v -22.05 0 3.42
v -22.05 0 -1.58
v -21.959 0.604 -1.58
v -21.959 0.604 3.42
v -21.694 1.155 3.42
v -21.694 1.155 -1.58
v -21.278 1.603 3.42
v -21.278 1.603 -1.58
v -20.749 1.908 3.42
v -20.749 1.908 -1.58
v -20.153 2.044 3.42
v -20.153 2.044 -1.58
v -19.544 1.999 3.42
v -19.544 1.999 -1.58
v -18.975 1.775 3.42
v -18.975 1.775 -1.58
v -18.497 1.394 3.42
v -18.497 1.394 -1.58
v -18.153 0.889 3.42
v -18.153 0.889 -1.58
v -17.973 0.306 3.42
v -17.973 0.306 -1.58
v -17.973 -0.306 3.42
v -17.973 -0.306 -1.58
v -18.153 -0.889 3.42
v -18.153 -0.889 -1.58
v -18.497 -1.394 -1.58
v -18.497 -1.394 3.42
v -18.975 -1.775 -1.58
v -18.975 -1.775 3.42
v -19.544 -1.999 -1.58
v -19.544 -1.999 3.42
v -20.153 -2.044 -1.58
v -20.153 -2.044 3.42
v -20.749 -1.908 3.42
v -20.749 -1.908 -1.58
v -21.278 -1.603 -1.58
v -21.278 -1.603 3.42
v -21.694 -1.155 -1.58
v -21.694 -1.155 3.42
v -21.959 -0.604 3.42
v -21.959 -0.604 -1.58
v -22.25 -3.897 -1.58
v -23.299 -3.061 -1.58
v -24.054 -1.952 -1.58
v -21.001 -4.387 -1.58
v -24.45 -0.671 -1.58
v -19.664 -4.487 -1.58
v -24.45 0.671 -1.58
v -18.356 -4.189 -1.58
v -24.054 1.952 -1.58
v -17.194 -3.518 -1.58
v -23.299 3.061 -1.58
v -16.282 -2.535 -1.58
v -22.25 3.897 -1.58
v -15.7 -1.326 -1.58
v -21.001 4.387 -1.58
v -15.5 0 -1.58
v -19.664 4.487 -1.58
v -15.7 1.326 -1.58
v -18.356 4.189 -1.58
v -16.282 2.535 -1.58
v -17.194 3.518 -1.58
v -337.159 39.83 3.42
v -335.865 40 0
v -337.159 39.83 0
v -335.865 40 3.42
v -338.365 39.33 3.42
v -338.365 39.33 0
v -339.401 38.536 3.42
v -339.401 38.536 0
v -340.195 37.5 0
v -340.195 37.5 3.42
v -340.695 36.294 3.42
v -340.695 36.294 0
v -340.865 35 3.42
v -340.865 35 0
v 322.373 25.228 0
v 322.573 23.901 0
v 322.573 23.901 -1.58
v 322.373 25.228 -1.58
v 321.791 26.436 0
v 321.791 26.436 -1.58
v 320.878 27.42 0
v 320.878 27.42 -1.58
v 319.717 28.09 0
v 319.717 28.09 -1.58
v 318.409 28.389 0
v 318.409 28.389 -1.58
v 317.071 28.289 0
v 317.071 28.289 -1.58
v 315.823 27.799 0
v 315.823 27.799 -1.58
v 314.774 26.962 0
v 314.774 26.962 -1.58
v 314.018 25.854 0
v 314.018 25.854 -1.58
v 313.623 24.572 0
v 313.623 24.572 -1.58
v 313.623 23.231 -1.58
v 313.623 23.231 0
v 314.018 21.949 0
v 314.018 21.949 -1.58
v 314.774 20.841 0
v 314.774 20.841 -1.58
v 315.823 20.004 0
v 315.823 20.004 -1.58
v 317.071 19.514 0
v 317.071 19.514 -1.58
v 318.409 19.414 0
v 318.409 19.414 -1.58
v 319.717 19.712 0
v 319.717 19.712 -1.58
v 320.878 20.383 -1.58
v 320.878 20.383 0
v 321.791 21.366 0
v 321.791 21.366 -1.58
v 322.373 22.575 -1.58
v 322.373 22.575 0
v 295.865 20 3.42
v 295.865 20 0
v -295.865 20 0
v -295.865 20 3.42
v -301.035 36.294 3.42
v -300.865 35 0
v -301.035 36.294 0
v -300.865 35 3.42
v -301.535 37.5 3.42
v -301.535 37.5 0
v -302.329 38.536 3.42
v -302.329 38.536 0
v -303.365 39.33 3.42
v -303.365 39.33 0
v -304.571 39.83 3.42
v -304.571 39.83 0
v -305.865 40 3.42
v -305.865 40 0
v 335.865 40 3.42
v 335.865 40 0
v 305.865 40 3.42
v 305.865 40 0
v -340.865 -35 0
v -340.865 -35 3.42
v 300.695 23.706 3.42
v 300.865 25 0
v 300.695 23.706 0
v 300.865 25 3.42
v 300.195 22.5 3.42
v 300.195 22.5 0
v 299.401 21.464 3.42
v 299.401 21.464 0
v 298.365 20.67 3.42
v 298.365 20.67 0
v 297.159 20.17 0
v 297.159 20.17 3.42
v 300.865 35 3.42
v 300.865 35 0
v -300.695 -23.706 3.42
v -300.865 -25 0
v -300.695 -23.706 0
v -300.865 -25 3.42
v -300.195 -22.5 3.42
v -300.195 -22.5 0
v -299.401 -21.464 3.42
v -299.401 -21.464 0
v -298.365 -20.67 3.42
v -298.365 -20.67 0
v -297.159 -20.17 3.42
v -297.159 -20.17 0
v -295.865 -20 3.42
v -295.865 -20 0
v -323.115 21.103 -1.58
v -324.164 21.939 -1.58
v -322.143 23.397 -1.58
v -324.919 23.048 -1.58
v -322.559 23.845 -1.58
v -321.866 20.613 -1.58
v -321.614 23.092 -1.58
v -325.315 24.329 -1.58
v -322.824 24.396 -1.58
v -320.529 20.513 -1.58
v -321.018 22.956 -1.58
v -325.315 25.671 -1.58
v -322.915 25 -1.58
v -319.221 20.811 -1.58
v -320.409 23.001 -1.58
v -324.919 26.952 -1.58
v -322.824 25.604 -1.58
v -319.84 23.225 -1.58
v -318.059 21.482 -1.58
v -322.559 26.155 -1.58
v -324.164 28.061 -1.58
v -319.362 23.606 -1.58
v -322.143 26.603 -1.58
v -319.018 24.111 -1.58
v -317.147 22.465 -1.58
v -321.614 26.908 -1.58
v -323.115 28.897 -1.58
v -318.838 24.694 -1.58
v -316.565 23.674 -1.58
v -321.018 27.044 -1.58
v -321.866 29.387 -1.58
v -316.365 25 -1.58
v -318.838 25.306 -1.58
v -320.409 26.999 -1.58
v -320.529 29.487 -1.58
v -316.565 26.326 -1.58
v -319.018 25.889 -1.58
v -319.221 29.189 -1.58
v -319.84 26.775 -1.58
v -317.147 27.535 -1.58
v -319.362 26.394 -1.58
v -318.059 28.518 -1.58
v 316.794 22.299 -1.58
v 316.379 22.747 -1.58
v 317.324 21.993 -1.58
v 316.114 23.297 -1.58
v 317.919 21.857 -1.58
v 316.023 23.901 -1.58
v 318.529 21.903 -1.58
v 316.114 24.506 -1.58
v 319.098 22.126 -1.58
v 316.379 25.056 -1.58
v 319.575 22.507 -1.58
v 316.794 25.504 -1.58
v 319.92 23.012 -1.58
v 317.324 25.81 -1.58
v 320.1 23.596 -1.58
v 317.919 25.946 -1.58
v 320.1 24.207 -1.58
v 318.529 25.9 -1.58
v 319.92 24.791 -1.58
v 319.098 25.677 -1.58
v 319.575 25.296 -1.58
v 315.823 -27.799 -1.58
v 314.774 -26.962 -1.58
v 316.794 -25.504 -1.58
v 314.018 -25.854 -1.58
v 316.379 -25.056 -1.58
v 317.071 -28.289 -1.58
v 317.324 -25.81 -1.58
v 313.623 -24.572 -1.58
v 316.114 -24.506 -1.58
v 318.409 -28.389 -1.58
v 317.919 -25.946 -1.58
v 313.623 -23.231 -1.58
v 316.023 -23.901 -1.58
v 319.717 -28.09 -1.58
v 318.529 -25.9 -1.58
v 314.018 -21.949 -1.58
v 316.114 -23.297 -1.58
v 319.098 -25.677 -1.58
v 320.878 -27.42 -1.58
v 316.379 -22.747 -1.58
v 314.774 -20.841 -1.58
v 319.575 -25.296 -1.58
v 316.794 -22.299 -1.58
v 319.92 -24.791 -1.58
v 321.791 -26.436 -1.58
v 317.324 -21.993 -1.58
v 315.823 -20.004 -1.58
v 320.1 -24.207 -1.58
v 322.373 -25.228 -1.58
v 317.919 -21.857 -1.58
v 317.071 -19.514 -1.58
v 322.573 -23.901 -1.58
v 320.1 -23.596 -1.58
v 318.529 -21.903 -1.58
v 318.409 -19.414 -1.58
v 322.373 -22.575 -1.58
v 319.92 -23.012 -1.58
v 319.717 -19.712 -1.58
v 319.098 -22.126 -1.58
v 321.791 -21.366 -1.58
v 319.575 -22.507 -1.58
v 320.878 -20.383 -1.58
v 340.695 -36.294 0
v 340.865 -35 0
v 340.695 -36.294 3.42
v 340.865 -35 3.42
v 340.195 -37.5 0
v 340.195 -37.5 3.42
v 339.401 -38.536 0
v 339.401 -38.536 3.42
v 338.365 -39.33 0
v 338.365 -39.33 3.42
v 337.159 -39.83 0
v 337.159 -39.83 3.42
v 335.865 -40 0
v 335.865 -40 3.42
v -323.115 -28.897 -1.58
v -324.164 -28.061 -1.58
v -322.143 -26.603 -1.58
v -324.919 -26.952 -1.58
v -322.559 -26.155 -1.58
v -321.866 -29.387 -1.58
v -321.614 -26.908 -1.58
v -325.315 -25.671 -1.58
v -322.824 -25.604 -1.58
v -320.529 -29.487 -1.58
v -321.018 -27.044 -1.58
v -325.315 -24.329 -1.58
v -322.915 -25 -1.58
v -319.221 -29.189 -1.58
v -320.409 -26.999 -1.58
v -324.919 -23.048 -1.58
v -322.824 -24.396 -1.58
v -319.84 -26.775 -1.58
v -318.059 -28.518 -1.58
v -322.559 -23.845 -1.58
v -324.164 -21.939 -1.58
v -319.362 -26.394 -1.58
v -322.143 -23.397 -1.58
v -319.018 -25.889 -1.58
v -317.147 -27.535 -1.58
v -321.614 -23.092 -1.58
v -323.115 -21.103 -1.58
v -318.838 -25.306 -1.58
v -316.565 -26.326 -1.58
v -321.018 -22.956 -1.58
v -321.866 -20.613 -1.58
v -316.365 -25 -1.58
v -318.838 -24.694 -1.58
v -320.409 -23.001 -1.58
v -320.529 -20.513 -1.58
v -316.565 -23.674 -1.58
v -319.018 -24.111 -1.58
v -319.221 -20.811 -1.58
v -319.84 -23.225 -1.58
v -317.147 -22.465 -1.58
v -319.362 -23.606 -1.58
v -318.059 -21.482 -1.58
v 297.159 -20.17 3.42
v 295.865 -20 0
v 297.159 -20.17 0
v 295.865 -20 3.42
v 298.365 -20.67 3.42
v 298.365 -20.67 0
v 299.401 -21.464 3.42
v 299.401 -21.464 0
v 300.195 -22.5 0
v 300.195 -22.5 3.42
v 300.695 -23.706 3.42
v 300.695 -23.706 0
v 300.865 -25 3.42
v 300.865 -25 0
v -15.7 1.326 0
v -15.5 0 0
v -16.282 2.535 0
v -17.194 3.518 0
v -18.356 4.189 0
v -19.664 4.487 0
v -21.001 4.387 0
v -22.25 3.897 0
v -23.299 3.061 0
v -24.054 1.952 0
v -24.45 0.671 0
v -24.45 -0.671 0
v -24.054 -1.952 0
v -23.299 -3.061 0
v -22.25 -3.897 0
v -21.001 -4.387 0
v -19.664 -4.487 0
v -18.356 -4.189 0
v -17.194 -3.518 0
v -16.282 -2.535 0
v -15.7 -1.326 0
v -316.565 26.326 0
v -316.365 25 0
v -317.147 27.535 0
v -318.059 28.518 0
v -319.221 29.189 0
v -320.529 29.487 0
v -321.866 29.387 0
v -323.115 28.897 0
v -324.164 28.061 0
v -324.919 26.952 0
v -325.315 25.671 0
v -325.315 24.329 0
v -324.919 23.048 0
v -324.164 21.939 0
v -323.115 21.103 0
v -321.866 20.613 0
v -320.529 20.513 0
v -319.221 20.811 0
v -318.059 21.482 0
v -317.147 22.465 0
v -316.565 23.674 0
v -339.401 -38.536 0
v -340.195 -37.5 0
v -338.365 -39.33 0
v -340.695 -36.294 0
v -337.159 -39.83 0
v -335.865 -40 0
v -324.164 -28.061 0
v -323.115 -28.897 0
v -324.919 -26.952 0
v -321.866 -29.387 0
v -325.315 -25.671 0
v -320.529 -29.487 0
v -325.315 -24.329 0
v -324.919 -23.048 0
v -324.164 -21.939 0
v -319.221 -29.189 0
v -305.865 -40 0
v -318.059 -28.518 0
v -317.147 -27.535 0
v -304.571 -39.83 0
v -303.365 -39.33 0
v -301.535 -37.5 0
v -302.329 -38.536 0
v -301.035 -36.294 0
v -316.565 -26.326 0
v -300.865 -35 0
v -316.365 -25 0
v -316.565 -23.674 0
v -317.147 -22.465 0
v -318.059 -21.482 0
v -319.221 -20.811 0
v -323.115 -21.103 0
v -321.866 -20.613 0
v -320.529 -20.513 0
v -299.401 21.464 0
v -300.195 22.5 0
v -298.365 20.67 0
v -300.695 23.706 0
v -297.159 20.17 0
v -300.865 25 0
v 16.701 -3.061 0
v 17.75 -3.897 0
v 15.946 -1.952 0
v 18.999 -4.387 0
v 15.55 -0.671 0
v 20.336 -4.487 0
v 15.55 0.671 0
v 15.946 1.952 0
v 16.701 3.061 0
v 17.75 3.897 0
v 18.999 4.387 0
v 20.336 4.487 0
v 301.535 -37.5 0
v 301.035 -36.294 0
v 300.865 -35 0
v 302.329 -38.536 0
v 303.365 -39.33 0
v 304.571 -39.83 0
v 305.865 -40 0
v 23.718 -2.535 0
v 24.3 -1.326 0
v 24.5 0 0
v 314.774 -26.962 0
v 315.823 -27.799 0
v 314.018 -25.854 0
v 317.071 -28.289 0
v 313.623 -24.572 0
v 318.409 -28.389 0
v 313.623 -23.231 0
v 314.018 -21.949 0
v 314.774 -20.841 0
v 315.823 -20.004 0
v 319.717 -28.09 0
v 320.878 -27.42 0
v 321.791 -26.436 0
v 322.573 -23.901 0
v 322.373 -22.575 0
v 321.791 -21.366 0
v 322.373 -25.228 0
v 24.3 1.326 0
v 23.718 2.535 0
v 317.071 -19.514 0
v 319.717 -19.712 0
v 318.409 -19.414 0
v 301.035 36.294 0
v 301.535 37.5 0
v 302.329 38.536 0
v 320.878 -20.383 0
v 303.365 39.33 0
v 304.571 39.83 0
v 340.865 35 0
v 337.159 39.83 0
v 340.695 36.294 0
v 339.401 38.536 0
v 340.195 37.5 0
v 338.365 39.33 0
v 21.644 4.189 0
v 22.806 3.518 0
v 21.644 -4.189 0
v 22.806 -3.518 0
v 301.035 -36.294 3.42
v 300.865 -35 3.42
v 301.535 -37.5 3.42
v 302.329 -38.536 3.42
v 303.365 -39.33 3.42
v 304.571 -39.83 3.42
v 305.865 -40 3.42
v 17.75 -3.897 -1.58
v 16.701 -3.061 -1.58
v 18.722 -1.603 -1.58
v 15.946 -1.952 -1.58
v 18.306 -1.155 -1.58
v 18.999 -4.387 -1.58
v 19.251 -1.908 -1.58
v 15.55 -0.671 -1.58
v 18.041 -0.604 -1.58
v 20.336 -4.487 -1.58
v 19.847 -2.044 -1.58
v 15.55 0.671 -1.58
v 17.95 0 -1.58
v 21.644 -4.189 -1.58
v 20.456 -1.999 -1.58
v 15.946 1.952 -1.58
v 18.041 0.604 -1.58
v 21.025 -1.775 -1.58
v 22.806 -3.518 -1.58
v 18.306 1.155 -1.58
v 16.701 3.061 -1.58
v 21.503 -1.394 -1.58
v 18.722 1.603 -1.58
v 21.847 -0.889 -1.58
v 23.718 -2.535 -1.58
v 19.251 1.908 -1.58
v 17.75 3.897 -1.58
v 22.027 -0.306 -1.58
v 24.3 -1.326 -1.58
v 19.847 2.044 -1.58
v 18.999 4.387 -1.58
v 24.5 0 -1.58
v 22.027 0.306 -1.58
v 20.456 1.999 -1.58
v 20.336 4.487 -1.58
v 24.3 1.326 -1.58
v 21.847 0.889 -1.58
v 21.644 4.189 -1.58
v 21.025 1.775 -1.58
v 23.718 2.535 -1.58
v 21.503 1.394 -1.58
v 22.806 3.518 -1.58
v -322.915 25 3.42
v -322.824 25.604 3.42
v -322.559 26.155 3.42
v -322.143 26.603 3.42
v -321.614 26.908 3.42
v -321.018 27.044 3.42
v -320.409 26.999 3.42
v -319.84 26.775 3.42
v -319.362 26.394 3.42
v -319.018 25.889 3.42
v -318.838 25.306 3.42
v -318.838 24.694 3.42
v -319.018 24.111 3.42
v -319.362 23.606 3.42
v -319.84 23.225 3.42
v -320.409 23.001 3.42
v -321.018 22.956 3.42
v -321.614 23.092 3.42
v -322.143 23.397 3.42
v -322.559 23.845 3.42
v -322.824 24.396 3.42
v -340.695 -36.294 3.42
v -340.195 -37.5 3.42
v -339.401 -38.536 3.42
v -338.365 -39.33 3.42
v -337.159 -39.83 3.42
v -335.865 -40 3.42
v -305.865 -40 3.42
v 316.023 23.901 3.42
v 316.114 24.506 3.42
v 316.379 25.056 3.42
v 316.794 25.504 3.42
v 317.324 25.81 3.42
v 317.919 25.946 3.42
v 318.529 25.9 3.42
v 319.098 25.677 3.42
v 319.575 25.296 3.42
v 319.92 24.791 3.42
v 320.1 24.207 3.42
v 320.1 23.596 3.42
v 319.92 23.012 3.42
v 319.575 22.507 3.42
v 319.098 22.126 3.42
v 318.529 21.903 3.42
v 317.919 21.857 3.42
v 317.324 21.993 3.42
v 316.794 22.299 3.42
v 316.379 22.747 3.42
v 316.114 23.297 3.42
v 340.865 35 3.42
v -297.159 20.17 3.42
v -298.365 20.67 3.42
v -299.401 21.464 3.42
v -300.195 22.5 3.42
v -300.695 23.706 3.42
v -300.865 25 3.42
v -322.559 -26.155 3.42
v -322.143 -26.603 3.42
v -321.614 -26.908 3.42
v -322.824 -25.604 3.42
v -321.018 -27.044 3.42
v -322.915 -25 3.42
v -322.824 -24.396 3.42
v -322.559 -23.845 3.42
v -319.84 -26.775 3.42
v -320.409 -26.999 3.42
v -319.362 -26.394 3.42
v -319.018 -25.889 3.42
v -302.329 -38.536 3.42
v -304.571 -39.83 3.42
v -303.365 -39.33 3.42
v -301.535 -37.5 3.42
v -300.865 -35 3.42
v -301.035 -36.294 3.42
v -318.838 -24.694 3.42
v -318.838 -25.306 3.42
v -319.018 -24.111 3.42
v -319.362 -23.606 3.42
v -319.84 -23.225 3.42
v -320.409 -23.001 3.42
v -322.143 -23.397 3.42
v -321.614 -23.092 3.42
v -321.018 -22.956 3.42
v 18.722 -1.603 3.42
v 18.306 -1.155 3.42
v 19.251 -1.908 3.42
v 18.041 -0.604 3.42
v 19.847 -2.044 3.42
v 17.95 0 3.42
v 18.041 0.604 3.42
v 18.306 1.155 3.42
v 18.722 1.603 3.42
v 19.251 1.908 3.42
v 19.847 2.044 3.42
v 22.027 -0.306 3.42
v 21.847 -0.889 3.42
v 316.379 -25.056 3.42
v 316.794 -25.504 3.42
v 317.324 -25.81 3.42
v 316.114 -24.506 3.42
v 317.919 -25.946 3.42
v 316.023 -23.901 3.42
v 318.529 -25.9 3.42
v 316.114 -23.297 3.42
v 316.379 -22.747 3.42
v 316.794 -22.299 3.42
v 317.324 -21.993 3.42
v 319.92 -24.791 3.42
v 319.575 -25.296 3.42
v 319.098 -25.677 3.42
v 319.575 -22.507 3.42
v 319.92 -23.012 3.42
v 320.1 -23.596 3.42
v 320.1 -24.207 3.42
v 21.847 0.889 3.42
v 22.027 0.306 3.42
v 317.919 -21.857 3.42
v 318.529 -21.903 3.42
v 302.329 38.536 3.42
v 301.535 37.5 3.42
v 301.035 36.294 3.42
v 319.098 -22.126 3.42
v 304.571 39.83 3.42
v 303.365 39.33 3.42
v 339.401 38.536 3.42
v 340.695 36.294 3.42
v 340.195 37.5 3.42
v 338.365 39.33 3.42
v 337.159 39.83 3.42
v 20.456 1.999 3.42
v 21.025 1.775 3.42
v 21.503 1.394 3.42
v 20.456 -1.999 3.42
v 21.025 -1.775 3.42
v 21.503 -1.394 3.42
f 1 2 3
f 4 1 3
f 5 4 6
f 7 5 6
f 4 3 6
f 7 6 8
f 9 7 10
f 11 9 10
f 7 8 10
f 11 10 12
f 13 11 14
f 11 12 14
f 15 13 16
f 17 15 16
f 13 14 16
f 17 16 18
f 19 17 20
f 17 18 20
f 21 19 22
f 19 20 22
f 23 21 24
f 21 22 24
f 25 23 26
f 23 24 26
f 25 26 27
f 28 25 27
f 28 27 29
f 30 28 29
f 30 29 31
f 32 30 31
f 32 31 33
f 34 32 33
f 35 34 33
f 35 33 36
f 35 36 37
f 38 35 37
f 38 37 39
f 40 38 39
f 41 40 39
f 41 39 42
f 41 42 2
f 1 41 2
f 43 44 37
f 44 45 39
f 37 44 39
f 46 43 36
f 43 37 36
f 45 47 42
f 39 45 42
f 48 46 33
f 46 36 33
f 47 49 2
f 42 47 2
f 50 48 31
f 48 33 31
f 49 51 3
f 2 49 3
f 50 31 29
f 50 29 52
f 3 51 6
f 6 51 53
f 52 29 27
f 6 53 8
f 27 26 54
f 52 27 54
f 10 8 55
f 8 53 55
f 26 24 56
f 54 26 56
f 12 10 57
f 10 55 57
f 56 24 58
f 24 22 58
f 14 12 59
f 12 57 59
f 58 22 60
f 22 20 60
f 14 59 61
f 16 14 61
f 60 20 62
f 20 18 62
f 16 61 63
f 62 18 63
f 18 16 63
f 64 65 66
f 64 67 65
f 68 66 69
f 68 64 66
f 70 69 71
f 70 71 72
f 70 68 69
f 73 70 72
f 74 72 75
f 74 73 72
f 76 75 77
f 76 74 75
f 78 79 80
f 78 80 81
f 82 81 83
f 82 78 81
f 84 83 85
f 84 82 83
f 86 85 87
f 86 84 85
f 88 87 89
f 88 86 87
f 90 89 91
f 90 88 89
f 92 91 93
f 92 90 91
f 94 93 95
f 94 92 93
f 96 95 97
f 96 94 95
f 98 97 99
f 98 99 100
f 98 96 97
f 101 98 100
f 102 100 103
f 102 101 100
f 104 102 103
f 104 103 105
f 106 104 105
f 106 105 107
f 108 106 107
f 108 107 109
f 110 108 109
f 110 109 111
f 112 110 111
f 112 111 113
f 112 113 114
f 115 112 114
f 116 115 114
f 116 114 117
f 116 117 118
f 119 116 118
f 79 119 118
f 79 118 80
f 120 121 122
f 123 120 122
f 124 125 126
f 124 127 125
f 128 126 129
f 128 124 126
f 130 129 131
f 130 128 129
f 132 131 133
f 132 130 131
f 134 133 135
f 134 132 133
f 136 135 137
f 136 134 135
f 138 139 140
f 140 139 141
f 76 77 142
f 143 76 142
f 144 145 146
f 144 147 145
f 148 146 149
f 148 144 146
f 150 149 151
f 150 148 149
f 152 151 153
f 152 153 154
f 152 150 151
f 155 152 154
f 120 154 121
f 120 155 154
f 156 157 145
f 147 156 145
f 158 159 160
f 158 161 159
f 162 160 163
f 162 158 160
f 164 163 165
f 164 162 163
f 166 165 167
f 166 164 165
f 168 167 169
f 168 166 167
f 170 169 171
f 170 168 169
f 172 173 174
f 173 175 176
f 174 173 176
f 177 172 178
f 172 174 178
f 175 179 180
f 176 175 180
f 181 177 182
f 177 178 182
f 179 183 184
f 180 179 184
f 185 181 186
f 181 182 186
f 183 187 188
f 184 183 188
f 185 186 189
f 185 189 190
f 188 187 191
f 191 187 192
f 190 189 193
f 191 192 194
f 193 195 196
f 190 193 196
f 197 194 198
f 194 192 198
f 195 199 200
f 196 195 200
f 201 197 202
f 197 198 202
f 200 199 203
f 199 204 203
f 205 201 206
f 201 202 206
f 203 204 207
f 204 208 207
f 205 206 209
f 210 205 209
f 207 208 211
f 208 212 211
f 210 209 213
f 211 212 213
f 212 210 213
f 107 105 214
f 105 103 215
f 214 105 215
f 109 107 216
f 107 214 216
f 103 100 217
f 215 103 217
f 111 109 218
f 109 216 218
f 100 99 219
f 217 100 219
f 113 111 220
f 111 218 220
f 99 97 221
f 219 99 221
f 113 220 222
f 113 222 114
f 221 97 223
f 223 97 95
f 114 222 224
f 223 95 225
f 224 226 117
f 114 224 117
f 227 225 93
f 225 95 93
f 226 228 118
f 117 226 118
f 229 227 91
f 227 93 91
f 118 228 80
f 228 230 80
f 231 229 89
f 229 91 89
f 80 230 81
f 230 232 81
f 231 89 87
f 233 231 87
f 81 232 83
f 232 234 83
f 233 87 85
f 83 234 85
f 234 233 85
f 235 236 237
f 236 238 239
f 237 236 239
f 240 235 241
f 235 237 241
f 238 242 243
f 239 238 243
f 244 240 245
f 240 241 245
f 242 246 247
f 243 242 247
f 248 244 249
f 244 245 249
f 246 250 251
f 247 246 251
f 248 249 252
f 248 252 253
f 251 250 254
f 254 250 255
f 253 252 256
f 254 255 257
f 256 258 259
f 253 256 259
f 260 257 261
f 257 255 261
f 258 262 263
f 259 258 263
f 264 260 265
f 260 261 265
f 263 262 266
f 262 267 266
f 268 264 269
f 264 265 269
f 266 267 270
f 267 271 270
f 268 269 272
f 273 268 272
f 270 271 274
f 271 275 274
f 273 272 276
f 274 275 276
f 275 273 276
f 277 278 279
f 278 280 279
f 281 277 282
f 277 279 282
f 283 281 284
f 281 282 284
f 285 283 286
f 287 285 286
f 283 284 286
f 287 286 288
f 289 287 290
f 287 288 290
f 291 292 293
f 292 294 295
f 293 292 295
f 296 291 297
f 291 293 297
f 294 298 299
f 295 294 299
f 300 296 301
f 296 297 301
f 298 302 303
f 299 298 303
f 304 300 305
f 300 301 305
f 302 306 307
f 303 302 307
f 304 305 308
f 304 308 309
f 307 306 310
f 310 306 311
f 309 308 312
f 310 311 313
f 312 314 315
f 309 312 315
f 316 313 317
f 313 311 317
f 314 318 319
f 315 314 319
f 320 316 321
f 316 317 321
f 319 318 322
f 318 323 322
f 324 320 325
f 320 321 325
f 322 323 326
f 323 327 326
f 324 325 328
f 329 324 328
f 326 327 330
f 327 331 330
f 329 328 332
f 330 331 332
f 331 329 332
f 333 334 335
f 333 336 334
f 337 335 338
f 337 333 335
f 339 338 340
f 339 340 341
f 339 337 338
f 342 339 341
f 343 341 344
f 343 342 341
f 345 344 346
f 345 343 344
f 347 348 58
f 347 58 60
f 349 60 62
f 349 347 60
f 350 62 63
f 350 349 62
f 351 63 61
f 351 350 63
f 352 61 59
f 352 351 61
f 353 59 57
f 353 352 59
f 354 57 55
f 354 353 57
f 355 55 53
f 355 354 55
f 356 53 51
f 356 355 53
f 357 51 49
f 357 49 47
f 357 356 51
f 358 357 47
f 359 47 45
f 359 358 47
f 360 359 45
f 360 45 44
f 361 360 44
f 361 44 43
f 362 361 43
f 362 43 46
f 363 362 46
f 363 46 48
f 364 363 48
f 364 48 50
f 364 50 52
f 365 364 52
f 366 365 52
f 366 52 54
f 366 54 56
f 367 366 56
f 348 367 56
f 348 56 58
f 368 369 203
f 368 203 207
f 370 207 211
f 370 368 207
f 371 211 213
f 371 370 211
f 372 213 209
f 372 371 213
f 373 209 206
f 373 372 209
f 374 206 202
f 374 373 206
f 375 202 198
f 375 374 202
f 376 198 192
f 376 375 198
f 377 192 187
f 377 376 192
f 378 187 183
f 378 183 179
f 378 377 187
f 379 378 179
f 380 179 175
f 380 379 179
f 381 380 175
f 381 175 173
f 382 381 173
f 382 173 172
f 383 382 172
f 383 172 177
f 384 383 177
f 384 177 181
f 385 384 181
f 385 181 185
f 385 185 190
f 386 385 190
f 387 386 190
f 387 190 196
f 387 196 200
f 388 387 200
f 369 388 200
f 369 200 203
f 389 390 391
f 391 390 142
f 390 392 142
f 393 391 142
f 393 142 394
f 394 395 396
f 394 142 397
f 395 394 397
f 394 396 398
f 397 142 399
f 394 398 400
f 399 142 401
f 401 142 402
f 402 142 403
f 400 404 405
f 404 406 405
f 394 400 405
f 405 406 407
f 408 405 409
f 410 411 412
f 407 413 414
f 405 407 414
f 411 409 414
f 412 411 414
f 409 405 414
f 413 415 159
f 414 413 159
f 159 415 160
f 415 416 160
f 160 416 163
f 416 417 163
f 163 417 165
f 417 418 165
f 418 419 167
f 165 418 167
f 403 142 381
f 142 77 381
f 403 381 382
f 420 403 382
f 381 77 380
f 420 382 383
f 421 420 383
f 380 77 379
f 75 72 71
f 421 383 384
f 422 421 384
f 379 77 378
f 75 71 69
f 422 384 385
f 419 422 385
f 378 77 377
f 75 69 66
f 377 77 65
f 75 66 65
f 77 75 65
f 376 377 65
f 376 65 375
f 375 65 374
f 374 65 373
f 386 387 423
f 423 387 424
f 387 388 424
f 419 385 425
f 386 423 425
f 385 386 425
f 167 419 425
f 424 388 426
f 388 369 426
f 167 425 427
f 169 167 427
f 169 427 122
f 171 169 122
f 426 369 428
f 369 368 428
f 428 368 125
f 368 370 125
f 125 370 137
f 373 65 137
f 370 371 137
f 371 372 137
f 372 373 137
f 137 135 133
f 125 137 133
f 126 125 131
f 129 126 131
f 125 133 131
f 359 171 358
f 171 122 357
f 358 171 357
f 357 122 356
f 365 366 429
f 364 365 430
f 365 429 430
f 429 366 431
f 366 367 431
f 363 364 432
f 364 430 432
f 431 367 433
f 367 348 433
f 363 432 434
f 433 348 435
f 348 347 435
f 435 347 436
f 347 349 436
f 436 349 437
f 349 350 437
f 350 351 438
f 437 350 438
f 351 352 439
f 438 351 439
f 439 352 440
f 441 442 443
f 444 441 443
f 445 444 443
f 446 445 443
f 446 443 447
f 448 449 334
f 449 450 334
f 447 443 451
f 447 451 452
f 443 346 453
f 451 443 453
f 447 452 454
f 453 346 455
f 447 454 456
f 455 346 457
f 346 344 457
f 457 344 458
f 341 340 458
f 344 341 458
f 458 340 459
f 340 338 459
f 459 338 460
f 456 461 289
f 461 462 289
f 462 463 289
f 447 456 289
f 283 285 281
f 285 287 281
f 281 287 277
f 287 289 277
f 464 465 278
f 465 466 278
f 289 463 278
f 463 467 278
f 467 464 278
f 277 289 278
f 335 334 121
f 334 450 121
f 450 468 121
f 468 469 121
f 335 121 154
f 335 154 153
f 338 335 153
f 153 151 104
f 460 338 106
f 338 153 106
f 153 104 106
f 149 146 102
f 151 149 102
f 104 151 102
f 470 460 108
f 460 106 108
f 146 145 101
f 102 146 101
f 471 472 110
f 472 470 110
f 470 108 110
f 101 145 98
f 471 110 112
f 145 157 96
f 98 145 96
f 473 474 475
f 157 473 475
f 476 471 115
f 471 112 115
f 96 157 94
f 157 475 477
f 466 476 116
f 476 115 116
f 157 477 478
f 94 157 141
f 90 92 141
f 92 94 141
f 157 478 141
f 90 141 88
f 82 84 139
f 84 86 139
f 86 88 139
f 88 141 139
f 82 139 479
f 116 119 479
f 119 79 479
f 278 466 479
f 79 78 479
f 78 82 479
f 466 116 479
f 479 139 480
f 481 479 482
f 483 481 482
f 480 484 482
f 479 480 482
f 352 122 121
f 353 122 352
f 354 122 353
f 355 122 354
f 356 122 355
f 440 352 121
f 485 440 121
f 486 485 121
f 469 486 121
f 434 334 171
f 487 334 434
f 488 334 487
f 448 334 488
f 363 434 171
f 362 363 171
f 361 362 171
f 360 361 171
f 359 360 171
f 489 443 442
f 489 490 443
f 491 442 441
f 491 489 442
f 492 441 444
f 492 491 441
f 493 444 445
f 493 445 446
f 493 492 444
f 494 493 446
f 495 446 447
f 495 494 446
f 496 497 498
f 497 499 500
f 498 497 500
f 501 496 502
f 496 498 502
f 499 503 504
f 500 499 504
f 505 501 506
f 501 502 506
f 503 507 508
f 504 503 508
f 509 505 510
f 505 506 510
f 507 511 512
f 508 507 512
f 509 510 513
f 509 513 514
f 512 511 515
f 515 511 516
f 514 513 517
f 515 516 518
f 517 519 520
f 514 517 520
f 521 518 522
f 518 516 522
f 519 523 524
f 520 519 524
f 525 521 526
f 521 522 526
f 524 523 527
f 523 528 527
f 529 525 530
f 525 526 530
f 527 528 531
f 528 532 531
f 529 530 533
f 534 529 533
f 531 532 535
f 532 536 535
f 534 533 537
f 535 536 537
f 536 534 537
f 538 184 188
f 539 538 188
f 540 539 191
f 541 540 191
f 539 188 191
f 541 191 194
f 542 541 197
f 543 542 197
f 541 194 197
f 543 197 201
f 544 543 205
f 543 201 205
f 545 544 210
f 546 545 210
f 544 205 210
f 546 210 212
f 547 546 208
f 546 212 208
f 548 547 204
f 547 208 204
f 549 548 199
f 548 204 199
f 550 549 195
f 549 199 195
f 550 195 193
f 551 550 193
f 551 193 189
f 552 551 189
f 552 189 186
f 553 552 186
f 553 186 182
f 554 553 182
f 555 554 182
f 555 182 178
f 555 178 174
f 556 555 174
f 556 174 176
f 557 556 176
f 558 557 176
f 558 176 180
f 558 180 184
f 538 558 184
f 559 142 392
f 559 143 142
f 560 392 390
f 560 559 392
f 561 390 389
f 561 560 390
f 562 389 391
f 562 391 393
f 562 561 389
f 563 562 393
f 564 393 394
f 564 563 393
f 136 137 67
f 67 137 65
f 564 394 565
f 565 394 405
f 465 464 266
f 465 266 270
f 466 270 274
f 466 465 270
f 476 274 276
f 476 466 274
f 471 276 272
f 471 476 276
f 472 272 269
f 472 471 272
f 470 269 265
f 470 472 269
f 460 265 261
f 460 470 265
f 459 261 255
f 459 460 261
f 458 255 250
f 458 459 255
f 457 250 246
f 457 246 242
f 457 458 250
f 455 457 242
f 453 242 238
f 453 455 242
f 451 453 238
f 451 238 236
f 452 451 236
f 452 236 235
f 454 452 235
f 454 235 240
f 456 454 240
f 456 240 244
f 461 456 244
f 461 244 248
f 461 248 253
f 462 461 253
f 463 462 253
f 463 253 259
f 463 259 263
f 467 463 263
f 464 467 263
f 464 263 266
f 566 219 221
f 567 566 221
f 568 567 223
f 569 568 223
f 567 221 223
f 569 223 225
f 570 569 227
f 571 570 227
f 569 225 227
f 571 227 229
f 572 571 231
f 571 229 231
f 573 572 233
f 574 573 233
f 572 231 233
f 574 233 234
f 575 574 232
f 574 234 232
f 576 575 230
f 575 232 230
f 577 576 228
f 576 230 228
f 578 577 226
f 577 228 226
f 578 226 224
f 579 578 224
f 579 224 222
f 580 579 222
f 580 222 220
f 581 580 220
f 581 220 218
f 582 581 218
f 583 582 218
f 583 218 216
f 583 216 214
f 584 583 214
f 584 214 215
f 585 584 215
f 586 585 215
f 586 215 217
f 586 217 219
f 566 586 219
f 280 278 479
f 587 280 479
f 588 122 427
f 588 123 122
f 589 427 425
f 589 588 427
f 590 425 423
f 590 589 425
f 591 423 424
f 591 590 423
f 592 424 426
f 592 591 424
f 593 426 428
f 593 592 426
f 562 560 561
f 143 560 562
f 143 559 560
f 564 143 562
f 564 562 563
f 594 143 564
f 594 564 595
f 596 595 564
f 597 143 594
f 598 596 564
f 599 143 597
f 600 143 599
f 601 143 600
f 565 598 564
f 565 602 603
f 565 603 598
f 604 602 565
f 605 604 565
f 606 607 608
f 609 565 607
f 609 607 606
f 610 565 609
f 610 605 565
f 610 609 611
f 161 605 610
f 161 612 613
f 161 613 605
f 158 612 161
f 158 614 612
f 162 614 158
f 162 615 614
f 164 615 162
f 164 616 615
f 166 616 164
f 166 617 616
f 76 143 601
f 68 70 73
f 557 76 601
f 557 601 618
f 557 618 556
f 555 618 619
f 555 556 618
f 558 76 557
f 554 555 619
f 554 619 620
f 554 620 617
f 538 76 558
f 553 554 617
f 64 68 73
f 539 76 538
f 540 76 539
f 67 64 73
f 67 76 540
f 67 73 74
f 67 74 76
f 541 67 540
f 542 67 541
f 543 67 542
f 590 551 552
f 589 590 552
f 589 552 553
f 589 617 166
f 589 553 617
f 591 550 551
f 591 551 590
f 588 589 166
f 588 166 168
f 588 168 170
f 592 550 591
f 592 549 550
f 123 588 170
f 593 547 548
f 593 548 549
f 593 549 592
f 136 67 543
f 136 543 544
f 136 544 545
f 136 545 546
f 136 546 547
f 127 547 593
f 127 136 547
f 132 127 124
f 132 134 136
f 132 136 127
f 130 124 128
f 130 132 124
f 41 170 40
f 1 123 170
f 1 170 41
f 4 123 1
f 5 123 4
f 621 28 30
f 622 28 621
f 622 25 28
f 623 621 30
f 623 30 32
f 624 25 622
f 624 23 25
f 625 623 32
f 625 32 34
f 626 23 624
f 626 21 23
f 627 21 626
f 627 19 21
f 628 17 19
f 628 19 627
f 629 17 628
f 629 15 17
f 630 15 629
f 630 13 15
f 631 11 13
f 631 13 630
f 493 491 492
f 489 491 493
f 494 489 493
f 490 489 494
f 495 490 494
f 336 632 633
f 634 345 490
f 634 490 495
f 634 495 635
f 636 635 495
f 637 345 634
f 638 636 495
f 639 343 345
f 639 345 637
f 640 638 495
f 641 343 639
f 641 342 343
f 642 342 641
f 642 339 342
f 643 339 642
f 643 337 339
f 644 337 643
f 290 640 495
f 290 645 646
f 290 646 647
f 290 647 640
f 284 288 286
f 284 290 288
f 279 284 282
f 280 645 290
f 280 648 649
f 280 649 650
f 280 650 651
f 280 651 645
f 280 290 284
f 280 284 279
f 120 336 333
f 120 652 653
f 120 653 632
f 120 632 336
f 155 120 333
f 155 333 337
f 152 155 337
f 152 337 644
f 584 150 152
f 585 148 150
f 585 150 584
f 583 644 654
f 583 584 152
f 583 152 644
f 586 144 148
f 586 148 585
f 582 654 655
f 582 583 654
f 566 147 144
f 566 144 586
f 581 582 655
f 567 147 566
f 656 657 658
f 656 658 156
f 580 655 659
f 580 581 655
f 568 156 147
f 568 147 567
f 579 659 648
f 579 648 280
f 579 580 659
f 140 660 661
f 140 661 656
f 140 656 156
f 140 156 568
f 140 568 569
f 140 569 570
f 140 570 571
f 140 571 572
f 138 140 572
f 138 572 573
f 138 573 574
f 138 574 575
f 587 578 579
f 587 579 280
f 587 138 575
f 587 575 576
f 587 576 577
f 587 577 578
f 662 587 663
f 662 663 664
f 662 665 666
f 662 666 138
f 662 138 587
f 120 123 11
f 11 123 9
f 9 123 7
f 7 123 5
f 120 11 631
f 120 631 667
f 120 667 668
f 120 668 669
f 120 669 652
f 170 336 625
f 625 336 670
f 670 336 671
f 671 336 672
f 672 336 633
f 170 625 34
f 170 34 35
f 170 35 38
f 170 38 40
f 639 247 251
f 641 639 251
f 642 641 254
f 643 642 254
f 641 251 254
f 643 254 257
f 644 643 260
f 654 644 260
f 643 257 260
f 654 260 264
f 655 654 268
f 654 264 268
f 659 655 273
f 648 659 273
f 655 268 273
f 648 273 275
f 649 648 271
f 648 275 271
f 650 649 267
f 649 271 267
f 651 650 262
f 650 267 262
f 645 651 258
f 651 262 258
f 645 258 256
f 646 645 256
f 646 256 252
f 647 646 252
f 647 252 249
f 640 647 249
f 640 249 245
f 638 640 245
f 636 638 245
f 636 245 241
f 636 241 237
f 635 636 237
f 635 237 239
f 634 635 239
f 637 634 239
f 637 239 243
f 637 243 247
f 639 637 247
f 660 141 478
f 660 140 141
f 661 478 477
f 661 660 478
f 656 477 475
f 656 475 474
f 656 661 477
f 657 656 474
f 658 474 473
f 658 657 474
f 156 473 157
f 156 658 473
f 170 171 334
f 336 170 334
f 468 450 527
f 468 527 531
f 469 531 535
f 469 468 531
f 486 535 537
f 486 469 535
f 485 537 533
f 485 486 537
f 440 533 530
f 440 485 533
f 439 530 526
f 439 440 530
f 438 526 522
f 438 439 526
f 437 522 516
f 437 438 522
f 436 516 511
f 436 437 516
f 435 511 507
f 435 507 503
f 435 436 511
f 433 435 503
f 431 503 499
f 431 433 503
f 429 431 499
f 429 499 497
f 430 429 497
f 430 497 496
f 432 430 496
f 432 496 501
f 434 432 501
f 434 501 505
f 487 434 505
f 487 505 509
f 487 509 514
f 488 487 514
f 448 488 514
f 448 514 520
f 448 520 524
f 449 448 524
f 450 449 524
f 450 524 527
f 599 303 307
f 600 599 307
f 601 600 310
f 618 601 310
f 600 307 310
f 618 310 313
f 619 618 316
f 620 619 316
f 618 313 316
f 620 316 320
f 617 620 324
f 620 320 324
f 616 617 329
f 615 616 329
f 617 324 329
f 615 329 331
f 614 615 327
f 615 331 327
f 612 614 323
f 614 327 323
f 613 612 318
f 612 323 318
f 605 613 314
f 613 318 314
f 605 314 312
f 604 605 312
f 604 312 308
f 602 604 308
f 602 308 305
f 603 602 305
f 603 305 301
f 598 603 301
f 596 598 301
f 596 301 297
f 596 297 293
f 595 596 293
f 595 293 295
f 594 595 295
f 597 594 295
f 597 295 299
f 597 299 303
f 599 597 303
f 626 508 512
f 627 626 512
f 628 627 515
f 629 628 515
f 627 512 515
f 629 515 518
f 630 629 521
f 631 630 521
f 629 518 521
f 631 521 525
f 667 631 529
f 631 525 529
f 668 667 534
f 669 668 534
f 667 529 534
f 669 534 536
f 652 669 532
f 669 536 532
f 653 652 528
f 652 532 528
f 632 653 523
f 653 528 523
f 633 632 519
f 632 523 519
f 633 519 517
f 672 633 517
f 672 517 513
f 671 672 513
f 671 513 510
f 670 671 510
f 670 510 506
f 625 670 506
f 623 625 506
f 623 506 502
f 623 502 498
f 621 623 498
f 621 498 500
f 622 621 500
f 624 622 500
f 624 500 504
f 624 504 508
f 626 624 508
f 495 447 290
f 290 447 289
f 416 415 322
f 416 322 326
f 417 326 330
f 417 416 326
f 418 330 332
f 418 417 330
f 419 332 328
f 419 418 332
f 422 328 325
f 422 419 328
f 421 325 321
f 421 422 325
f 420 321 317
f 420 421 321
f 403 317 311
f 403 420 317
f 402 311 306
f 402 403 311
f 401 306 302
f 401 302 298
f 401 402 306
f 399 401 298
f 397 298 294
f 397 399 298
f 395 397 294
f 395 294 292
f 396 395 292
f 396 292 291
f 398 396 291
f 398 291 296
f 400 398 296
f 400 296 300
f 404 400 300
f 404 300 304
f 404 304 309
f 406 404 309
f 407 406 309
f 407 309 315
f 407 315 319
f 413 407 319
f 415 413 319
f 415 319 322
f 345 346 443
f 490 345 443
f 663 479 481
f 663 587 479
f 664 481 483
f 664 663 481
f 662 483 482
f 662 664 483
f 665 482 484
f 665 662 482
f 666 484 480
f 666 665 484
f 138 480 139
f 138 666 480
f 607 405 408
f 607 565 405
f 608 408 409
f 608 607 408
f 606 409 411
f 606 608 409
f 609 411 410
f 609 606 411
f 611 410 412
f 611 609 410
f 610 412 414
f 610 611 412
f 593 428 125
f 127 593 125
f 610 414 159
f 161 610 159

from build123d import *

# Parameters (mm, degrees)
F1_DEPTH = 3.42
F2_R     = 5
F3_R     = 4.5
F4_DEPTH = 5
F5_D     = 4.1


with BuildPart() as f1:
    # F0 (on Top) → F1 (new body)
    with BuildSketch(Plane.XY):
        Polygon((340.865, -40), (340.865, 40), (300.865, 40), (300.865, 20), (-300.865, 20), (-300.865, 40), (-340.865, 40), (-340.865, -40), (-300.865, -40), (-300.865, -20), (300.865, -20), (300.865, -40), align=None)
    extrude(amount=F1_DEPTH)

    # F2
    f2_edges = [f1.edges().sort_by_distance(p)[0] for p in [
        (-340.865, 40, 1.71),
        (-340.865, -40, 1.71),
        (-300.865, 40, 1.71),
        (-300.865, 20, 1.71),
        (-300.865, -20, 1.71),
        (-300.865, -40, 1.71),
        (300.865, 20, 1.71),
        (300.865, 40, 1.71),
        (340.865, 40, 1.71),
        (300.865, -40, 1.71),
        (300.865, -20, 1.71),
        (340.865, -40, 1.71),
    ]]
    fillet(f2_edges, radius=F2_R)

    # F3 (on face) → F4 (join)
    with BuildSketch(Plane.XY.offset(3.42)):
        with Locations((-320.865, 25)):
            Circle(F3_R)
        with Locations((-320.865, -25)):
            Circle(F3_R)
        with Locations((-20, 0)):
            Circle(F3_R)
        with Locations((20, 0)):
            Circle(F3_R)
        with Locations((318.0725574493, 23.9014066756)):
            Circle(F3_R)
        with Locations((318.0725574493, -23.9014066756)):
            Circle(F3_R)
    extrude(amount=-F4_DEPTH)

    # F5 (through all)
    with Locations(Plane.XY.offset(3.42)):
        with Locations((-320.865, -25), (-20, 0), (20, 0), (318.0725574493, 23.9014066756), (318.0725574493, -23.9014066756), (-320.865, 25)):
            Hole(F5_D / 2)


solid = f1.part
